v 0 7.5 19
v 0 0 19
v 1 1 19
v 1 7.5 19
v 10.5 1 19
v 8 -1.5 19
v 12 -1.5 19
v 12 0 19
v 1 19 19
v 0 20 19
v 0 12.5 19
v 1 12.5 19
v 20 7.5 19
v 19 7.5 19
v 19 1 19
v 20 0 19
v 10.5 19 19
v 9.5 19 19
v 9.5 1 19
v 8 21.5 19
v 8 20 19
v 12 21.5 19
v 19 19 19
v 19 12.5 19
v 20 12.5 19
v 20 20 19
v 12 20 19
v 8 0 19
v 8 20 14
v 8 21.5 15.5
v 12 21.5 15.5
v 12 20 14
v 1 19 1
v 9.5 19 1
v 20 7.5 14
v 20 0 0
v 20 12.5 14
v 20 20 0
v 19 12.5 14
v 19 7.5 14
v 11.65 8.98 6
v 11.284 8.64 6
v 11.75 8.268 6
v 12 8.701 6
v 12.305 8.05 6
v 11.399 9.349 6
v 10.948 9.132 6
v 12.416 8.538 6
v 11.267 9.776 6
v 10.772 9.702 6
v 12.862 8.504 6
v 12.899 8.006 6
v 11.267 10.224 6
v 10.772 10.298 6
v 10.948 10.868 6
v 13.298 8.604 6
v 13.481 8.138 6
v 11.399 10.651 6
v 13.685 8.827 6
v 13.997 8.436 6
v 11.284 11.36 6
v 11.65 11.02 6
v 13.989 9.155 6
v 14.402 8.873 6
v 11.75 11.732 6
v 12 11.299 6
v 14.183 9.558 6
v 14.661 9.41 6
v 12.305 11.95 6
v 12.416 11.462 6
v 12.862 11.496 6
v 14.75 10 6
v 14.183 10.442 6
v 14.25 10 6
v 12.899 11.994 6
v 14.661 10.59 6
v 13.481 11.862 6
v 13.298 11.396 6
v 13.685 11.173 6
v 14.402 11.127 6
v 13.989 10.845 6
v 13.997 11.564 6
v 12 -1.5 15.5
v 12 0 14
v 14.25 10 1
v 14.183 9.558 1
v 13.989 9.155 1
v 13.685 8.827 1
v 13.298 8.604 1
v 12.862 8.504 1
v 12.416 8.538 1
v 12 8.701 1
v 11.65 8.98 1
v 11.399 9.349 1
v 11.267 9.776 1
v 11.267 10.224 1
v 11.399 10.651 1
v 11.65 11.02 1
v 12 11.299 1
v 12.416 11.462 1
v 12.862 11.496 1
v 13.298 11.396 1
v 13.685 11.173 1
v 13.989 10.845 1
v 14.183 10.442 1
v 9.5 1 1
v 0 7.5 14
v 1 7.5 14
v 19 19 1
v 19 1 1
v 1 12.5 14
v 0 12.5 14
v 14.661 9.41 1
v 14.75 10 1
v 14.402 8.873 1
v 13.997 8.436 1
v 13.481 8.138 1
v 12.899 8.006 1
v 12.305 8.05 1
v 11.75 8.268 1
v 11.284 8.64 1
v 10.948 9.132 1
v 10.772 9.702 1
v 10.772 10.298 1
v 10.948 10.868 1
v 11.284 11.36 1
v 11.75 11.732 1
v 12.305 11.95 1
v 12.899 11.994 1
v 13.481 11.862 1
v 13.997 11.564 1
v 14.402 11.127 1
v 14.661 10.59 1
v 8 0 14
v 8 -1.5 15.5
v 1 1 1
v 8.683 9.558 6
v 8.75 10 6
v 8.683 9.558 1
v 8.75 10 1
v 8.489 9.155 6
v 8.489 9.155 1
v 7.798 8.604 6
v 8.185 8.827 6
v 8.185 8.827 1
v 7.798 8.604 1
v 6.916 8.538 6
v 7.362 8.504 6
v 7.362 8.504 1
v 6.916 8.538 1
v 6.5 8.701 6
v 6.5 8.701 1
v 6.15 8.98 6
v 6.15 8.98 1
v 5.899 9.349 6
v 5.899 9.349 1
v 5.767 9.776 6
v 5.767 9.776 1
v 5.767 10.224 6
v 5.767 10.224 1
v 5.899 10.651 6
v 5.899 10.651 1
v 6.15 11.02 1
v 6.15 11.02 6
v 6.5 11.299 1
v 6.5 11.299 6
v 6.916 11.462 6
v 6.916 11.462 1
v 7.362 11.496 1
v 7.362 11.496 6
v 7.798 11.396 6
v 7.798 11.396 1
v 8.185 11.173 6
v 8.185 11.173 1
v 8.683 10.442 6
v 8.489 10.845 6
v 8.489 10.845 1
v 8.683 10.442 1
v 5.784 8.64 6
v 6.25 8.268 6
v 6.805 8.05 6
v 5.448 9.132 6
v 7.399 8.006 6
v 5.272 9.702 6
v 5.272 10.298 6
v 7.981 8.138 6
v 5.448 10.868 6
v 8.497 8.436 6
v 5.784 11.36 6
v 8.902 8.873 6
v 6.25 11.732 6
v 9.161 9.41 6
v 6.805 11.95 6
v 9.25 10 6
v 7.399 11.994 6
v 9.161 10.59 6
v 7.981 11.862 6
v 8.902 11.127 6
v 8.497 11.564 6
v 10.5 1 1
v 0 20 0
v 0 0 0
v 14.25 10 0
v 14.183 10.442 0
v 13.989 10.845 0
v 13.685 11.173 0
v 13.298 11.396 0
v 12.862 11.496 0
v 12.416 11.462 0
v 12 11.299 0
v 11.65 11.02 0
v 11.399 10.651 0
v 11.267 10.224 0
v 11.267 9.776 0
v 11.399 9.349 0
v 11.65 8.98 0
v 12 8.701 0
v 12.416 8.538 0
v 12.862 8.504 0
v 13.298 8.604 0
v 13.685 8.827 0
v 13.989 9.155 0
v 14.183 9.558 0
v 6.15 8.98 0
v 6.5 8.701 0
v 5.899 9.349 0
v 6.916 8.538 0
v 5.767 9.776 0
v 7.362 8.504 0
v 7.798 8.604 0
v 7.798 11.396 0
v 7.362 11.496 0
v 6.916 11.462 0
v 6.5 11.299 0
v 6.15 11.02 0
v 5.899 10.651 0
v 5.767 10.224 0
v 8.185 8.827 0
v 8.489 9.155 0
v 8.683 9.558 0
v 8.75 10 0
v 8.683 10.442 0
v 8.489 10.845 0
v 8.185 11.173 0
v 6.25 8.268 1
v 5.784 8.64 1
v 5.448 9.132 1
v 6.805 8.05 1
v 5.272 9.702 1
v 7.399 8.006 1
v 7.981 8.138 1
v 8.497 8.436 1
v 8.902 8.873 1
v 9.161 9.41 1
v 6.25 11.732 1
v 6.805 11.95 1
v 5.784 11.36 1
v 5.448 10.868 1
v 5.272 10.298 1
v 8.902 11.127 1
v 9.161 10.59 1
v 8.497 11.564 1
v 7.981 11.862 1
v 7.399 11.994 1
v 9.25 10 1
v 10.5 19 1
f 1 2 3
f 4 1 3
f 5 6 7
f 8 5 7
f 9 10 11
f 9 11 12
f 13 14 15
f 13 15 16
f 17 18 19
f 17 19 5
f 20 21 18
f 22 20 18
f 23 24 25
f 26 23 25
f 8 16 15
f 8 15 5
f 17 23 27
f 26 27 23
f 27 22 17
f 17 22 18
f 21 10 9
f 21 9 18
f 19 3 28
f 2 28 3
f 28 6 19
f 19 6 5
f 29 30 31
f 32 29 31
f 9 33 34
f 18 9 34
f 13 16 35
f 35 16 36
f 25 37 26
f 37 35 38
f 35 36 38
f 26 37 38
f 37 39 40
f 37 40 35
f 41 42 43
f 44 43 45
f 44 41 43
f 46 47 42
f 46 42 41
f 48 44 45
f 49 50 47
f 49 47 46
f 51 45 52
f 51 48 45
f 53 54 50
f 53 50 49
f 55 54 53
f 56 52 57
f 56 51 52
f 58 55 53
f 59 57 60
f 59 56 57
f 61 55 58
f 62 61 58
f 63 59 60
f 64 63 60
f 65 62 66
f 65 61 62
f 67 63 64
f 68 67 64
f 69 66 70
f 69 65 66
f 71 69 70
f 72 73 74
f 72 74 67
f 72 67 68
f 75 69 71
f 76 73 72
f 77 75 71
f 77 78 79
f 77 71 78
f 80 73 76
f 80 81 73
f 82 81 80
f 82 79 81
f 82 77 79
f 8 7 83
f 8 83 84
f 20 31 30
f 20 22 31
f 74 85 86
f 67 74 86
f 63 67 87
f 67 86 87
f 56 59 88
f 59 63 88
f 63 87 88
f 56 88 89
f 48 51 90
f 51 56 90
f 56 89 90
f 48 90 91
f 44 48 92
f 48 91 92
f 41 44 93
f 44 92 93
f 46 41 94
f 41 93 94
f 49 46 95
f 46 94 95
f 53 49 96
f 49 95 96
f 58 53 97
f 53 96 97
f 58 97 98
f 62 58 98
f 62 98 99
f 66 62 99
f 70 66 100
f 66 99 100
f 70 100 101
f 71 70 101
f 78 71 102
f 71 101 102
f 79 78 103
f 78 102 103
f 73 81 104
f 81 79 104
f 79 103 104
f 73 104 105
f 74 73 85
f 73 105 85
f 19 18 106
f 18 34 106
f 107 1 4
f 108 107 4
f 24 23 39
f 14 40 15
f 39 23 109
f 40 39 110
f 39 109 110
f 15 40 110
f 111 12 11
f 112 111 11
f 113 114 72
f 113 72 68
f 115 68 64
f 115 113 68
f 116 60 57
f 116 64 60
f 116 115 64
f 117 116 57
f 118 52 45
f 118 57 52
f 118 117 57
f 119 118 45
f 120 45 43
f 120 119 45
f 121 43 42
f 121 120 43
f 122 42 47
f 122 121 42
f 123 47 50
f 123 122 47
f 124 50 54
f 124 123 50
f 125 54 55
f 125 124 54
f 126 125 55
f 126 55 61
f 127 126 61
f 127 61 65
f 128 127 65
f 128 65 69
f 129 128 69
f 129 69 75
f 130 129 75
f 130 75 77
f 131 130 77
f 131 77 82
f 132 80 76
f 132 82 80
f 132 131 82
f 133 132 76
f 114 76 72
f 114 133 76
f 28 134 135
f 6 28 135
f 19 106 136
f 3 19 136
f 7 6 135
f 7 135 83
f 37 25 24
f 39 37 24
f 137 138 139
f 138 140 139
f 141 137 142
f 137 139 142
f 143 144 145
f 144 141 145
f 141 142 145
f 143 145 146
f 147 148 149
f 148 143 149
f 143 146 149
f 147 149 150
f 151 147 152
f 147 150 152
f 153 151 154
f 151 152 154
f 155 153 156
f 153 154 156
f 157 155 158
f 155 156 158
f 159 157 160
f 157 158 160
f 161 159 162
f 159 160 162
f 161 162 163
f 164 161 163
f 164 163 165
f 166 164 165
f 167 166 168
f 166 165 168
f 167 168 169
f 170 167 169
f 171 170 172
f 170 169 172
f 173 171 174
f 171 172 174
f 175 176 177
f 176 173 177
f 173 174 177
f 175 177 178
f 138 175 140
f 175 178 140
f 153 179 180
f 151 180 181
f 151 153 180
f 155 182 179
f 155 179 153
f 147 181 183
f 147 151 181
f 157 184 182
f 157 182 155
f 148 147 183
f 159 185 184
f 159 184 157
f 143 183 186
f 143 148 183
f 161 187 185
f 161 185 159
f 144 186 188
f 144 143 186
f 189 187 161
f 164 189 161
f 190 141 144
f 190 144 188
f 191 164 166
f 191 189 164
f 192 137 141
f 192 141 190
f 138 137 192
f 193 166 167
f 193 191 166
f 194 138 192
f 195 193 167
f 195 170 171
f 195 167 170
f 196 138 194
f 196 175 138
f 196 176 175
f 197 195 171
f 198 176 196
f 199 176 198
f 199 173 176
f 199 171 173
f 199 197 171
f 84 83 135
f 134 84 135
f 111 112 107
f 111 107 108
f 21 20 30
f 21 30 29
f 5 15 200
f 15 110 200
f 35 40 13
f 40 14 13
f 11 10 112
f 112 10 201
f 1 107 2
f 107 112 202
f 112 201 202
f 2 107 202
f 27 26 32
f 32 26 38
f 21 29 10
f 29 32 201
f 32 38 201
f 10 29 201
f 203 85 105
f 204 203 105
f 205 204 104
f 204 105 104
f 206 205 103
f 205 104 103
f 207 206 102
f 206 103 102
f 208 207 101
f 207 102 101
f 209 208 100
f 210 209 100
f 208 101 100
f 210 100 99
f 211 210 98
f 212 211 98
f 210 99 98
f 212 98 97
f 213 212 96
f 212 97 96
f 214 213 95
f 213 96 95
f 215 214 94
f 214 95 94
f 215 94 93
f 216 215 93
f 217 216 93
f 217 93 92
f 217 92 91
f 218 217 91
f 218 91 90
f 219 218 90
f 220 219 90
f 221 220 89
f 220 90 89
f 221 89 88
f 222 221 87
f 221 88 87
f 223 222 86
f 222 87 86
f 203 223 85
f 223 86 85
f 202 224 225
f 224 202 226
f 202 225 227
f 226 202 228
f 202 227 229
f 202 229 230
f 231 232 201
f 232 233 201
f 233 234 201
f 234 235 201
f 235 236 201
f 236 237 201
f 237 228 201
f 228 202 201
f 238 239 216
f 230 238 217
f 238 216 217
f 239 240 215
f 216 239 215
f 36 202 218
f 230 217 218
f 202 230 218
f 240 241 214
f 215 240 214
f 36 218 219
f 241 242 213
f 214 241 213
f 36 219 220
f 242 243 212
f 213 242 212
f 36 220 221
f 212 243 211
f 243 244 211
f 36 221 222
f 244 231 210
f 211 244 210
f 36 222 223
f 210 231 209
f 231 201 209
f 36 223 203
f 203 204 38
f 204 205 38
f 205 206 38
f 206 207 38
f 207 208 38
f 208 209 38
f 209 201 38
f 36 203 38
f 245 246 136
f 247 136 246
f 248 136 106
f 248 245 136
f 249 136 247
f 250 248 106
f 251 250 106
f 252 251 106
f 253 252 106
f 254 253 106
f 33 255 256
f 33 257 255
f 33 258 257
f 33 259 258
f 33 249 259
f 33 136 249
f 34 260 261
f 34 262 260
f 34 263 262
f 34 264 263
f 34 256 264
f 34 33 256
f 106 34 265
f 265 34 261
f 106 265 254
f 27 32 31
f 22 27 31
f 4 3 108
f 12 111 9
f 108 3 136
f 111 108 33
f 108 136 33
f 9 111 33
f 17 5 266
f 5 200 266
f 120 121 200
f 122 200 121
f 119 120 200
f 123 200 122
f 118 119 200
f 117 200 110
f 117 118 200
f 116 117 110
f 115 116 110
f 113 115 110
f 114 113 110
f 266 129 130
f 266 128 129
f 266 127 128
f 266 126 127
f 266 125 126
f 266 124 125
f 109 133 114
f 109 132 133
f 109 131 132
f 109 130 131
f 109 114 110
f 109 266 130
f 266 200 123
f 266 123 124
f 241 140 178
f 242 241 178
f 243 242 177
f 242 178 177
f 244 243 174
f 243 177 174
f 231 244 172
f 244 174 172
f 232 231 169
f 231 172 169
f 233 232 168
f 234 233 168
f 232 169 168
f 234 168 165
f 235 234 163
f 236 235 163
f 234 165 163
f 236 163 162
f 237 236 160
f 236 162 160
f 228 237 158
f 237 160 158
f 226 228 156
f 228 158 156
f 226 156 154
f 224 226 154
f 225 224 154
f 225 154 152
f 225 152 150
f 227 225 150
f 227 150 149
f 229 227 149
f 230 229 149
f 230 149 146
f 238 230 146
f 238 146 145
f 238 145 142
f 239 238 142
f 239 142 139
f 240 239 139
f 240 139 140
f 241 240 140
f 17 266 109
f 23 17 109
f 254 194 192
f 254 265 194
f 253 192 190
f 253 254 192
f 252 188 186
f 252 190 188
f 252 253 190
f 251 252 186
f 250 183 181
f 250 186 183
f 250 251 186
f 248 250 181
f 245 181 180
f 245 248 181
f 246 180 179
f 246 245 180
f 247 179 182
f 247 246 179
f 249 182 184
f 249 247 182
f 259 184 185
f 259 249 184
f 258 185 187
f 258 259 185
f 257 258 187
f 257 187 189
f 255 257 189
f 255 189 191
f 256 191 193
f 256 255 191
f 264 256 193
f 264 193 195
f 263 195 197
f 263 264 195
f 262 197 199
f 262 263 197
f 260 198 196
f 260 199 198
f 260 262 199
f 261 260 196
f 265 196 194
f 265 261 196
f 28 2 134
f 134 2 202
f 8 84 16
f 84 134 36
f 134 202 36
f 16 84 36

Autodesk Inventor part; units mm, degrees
ref_plane "YZ Plane" through (0, 0, 0) normal (1, 0, 0) x (0, 1, 0)
ref_plane "XZ Plane" through (0, 0, 0) normal (0, 1, 0) x (-1, 0, 0)
ref_plane "XY Plane" through (0, 0, 0) normal (0, 0, 1) x (1, 0, 0)
sketch "Esboço1" plane through (0, 0, 0) normal (0, 0, 1) x (1, 0, 0)
  line L0 (0, 0) -> (20, 0)
  line L1 (20, 0) -> (20, 20)
  line L2 (20, 20) -> (0, 20)
  line L3 (0, 20) -> (0, 0)
  dimension "d0" = 20
  dimension "d1" = 20
extrude "Extrusão1" add sketch "Esboço1" along normal blind 1
sketch "Esboço2" plane through (0, 0, 1) normal (0, 0, 1) x (1, 0, 0)
  circle A0 centre (7.25, 10) radius 1.5
  circle A1 centre (12.75, 10) radius 1.5
  line L0 (0, 0) -> (20, 0) projected
  line L1 (20, 0) -> (20, 20) projected
  dimension "d4" = 3
  dimension "d5" = 3
  dimension "d6" = 5.5
  dimension "d7" = 10
  dimension "d8" = 10
  dimension "d9" = 7.25
extrude "Extrusão2" cut sketch "Esboço2" against normal blind 1
sketch "Esboço3" plane through (0, 0, 1) normal (0, 0, 1) x (1, 0, 0)
  circle A0 centre (7.25, 10) radius 1.5 projected
  circle A1 centre (7.25, 10) radius 2
  circle A2 centre (12.75, 10) radius 1.5 projected
  circle A3 centre (12.75, 10) radius 2
  point P0 (0, 0)
  dimension "d12" = 4
  dimension "d13" = 4
extrude "Extrusão3" add sketch "Esboço3" along normal blind 5
sketch "Esboço4" plane through (0, 0, 1) normal (0, 0, 1) x (1, 0, 0)
  line L0 (20, 20) -> (0, 20) projected
  line L1 (10.5, 20) -> (9.5, 20)
  line L2 (9.5, 20) -> (9.5, 0)
  line L3 (9.5, 0) -> (10.5, 0)
  line L4 (10.5, 0) -> (10.5, 20)
  line L5 (0, 20) -> (0, 0) projected
  line L6 (20, 0) -> (20, 20) projected
  line L7 (0, 0) -> (20, 0) projected
  line L8 (1, 19) -> (19, 19)
  line L9 (19, 19) -> (19, 1)
  line L10 (19, 1) -> (1, 1)
  line L11 (1, 1) -> (1, 19)
  point P0 (9.5, 0)
  point P1 (10.5, 19)
  point P2 (10.5, 1)
  point P3 (9.5, 19)
  point P4 (9.5, 1)
  dimension "d16" = 9.5
  dimension "d17" = 9.5
  dimension "d18" = 0
  dimension "d19" = 1
extrude "Extrusão4" add sketch "Esboço4" along normal blind 18 contours L6 L7 L4 L10 L9 L8 L0 | L4 L8 L2 L0 | L2 L8 L11 L10 L7 L5 L0 | L4 L10 L2 L8 | L3 L2 L10 L4
sketch "Esboço5" plane through (0, 0, 19) normal (0, 0, 1) x (1, 0, 0)
  line L0 (0, 20) -> (0, 0) projected
  line L1 (1, 1) -> (1, 19) projected
  line L2 (0, 7.5) -> (1, 7.5)
  line L3 (1, 7.5) -> (1, 12.5)
  line L4 (1, 12.5) -> (0, 12.5)
  line L5 (0, 12.5) -> (0, 7.5)
  line L6 (19, 1) -> (19, 19) projected
  line L7 (20, 0) -> (20, 20) projected
  line L8 (19, 7.5) -> (20, 7.5)
  line L9 (20, 7.5) -> (20, 12.5)
  line L10 (20, 12.5) -> (19, 12.5)
  line L11 (19, 12.5) -> (19, 7.5)
  line L12 (20, 20) -> (0, 20) projected
  point P0 (0, 12.5)
  dimension "d22" = 5
  dimension "d23" = 7.5
  dimension "d24" = 5
  dimension "d25" = 7.5
extrude "Extrusão5" cut sketch "Esboço5" against normal blind 5
sketch "Esboço6" plane through (0, 0, 19) normal (0, 0, 1) x (1, 0, 0)
  line L0 (20, 20) -> (0, 20) projected
  line L1 (8, 20) -> (12, 20)
  line L2 (12, 20) -> (12, 21.5)
  line L3 (12, 21.5) -> (8, 21.5)
  line L4 (8, 21.5) -> (8, 20)
  line L5 (0, 0) -> (20, 0) projected
  line L6 (12, 0) -> (8, 0)
  line L7 (8, 0) -> (8, -1.5)
  line L8 (8, -1.5) -> (12, -1.5)
  line L9 (12, -1.5) -> (12, 0)
  dimension "d28" = 8
  dimension "d29" = 8
  dimension "d30" = 1.5
  dimension "d36" = 1.5
  dimension "d37" = 8
  dimension "d38" = 8
extrude "Extrusão6" add sketch "Esboço6" against normal blind 5
chamfer "Chanfro1" distance 1.5 angle 45 2 edges at (10, 21.5, 14) (10, -1.5, 14)
properties part number "caixaled_pt1" material "Plástico PC/ABS"
